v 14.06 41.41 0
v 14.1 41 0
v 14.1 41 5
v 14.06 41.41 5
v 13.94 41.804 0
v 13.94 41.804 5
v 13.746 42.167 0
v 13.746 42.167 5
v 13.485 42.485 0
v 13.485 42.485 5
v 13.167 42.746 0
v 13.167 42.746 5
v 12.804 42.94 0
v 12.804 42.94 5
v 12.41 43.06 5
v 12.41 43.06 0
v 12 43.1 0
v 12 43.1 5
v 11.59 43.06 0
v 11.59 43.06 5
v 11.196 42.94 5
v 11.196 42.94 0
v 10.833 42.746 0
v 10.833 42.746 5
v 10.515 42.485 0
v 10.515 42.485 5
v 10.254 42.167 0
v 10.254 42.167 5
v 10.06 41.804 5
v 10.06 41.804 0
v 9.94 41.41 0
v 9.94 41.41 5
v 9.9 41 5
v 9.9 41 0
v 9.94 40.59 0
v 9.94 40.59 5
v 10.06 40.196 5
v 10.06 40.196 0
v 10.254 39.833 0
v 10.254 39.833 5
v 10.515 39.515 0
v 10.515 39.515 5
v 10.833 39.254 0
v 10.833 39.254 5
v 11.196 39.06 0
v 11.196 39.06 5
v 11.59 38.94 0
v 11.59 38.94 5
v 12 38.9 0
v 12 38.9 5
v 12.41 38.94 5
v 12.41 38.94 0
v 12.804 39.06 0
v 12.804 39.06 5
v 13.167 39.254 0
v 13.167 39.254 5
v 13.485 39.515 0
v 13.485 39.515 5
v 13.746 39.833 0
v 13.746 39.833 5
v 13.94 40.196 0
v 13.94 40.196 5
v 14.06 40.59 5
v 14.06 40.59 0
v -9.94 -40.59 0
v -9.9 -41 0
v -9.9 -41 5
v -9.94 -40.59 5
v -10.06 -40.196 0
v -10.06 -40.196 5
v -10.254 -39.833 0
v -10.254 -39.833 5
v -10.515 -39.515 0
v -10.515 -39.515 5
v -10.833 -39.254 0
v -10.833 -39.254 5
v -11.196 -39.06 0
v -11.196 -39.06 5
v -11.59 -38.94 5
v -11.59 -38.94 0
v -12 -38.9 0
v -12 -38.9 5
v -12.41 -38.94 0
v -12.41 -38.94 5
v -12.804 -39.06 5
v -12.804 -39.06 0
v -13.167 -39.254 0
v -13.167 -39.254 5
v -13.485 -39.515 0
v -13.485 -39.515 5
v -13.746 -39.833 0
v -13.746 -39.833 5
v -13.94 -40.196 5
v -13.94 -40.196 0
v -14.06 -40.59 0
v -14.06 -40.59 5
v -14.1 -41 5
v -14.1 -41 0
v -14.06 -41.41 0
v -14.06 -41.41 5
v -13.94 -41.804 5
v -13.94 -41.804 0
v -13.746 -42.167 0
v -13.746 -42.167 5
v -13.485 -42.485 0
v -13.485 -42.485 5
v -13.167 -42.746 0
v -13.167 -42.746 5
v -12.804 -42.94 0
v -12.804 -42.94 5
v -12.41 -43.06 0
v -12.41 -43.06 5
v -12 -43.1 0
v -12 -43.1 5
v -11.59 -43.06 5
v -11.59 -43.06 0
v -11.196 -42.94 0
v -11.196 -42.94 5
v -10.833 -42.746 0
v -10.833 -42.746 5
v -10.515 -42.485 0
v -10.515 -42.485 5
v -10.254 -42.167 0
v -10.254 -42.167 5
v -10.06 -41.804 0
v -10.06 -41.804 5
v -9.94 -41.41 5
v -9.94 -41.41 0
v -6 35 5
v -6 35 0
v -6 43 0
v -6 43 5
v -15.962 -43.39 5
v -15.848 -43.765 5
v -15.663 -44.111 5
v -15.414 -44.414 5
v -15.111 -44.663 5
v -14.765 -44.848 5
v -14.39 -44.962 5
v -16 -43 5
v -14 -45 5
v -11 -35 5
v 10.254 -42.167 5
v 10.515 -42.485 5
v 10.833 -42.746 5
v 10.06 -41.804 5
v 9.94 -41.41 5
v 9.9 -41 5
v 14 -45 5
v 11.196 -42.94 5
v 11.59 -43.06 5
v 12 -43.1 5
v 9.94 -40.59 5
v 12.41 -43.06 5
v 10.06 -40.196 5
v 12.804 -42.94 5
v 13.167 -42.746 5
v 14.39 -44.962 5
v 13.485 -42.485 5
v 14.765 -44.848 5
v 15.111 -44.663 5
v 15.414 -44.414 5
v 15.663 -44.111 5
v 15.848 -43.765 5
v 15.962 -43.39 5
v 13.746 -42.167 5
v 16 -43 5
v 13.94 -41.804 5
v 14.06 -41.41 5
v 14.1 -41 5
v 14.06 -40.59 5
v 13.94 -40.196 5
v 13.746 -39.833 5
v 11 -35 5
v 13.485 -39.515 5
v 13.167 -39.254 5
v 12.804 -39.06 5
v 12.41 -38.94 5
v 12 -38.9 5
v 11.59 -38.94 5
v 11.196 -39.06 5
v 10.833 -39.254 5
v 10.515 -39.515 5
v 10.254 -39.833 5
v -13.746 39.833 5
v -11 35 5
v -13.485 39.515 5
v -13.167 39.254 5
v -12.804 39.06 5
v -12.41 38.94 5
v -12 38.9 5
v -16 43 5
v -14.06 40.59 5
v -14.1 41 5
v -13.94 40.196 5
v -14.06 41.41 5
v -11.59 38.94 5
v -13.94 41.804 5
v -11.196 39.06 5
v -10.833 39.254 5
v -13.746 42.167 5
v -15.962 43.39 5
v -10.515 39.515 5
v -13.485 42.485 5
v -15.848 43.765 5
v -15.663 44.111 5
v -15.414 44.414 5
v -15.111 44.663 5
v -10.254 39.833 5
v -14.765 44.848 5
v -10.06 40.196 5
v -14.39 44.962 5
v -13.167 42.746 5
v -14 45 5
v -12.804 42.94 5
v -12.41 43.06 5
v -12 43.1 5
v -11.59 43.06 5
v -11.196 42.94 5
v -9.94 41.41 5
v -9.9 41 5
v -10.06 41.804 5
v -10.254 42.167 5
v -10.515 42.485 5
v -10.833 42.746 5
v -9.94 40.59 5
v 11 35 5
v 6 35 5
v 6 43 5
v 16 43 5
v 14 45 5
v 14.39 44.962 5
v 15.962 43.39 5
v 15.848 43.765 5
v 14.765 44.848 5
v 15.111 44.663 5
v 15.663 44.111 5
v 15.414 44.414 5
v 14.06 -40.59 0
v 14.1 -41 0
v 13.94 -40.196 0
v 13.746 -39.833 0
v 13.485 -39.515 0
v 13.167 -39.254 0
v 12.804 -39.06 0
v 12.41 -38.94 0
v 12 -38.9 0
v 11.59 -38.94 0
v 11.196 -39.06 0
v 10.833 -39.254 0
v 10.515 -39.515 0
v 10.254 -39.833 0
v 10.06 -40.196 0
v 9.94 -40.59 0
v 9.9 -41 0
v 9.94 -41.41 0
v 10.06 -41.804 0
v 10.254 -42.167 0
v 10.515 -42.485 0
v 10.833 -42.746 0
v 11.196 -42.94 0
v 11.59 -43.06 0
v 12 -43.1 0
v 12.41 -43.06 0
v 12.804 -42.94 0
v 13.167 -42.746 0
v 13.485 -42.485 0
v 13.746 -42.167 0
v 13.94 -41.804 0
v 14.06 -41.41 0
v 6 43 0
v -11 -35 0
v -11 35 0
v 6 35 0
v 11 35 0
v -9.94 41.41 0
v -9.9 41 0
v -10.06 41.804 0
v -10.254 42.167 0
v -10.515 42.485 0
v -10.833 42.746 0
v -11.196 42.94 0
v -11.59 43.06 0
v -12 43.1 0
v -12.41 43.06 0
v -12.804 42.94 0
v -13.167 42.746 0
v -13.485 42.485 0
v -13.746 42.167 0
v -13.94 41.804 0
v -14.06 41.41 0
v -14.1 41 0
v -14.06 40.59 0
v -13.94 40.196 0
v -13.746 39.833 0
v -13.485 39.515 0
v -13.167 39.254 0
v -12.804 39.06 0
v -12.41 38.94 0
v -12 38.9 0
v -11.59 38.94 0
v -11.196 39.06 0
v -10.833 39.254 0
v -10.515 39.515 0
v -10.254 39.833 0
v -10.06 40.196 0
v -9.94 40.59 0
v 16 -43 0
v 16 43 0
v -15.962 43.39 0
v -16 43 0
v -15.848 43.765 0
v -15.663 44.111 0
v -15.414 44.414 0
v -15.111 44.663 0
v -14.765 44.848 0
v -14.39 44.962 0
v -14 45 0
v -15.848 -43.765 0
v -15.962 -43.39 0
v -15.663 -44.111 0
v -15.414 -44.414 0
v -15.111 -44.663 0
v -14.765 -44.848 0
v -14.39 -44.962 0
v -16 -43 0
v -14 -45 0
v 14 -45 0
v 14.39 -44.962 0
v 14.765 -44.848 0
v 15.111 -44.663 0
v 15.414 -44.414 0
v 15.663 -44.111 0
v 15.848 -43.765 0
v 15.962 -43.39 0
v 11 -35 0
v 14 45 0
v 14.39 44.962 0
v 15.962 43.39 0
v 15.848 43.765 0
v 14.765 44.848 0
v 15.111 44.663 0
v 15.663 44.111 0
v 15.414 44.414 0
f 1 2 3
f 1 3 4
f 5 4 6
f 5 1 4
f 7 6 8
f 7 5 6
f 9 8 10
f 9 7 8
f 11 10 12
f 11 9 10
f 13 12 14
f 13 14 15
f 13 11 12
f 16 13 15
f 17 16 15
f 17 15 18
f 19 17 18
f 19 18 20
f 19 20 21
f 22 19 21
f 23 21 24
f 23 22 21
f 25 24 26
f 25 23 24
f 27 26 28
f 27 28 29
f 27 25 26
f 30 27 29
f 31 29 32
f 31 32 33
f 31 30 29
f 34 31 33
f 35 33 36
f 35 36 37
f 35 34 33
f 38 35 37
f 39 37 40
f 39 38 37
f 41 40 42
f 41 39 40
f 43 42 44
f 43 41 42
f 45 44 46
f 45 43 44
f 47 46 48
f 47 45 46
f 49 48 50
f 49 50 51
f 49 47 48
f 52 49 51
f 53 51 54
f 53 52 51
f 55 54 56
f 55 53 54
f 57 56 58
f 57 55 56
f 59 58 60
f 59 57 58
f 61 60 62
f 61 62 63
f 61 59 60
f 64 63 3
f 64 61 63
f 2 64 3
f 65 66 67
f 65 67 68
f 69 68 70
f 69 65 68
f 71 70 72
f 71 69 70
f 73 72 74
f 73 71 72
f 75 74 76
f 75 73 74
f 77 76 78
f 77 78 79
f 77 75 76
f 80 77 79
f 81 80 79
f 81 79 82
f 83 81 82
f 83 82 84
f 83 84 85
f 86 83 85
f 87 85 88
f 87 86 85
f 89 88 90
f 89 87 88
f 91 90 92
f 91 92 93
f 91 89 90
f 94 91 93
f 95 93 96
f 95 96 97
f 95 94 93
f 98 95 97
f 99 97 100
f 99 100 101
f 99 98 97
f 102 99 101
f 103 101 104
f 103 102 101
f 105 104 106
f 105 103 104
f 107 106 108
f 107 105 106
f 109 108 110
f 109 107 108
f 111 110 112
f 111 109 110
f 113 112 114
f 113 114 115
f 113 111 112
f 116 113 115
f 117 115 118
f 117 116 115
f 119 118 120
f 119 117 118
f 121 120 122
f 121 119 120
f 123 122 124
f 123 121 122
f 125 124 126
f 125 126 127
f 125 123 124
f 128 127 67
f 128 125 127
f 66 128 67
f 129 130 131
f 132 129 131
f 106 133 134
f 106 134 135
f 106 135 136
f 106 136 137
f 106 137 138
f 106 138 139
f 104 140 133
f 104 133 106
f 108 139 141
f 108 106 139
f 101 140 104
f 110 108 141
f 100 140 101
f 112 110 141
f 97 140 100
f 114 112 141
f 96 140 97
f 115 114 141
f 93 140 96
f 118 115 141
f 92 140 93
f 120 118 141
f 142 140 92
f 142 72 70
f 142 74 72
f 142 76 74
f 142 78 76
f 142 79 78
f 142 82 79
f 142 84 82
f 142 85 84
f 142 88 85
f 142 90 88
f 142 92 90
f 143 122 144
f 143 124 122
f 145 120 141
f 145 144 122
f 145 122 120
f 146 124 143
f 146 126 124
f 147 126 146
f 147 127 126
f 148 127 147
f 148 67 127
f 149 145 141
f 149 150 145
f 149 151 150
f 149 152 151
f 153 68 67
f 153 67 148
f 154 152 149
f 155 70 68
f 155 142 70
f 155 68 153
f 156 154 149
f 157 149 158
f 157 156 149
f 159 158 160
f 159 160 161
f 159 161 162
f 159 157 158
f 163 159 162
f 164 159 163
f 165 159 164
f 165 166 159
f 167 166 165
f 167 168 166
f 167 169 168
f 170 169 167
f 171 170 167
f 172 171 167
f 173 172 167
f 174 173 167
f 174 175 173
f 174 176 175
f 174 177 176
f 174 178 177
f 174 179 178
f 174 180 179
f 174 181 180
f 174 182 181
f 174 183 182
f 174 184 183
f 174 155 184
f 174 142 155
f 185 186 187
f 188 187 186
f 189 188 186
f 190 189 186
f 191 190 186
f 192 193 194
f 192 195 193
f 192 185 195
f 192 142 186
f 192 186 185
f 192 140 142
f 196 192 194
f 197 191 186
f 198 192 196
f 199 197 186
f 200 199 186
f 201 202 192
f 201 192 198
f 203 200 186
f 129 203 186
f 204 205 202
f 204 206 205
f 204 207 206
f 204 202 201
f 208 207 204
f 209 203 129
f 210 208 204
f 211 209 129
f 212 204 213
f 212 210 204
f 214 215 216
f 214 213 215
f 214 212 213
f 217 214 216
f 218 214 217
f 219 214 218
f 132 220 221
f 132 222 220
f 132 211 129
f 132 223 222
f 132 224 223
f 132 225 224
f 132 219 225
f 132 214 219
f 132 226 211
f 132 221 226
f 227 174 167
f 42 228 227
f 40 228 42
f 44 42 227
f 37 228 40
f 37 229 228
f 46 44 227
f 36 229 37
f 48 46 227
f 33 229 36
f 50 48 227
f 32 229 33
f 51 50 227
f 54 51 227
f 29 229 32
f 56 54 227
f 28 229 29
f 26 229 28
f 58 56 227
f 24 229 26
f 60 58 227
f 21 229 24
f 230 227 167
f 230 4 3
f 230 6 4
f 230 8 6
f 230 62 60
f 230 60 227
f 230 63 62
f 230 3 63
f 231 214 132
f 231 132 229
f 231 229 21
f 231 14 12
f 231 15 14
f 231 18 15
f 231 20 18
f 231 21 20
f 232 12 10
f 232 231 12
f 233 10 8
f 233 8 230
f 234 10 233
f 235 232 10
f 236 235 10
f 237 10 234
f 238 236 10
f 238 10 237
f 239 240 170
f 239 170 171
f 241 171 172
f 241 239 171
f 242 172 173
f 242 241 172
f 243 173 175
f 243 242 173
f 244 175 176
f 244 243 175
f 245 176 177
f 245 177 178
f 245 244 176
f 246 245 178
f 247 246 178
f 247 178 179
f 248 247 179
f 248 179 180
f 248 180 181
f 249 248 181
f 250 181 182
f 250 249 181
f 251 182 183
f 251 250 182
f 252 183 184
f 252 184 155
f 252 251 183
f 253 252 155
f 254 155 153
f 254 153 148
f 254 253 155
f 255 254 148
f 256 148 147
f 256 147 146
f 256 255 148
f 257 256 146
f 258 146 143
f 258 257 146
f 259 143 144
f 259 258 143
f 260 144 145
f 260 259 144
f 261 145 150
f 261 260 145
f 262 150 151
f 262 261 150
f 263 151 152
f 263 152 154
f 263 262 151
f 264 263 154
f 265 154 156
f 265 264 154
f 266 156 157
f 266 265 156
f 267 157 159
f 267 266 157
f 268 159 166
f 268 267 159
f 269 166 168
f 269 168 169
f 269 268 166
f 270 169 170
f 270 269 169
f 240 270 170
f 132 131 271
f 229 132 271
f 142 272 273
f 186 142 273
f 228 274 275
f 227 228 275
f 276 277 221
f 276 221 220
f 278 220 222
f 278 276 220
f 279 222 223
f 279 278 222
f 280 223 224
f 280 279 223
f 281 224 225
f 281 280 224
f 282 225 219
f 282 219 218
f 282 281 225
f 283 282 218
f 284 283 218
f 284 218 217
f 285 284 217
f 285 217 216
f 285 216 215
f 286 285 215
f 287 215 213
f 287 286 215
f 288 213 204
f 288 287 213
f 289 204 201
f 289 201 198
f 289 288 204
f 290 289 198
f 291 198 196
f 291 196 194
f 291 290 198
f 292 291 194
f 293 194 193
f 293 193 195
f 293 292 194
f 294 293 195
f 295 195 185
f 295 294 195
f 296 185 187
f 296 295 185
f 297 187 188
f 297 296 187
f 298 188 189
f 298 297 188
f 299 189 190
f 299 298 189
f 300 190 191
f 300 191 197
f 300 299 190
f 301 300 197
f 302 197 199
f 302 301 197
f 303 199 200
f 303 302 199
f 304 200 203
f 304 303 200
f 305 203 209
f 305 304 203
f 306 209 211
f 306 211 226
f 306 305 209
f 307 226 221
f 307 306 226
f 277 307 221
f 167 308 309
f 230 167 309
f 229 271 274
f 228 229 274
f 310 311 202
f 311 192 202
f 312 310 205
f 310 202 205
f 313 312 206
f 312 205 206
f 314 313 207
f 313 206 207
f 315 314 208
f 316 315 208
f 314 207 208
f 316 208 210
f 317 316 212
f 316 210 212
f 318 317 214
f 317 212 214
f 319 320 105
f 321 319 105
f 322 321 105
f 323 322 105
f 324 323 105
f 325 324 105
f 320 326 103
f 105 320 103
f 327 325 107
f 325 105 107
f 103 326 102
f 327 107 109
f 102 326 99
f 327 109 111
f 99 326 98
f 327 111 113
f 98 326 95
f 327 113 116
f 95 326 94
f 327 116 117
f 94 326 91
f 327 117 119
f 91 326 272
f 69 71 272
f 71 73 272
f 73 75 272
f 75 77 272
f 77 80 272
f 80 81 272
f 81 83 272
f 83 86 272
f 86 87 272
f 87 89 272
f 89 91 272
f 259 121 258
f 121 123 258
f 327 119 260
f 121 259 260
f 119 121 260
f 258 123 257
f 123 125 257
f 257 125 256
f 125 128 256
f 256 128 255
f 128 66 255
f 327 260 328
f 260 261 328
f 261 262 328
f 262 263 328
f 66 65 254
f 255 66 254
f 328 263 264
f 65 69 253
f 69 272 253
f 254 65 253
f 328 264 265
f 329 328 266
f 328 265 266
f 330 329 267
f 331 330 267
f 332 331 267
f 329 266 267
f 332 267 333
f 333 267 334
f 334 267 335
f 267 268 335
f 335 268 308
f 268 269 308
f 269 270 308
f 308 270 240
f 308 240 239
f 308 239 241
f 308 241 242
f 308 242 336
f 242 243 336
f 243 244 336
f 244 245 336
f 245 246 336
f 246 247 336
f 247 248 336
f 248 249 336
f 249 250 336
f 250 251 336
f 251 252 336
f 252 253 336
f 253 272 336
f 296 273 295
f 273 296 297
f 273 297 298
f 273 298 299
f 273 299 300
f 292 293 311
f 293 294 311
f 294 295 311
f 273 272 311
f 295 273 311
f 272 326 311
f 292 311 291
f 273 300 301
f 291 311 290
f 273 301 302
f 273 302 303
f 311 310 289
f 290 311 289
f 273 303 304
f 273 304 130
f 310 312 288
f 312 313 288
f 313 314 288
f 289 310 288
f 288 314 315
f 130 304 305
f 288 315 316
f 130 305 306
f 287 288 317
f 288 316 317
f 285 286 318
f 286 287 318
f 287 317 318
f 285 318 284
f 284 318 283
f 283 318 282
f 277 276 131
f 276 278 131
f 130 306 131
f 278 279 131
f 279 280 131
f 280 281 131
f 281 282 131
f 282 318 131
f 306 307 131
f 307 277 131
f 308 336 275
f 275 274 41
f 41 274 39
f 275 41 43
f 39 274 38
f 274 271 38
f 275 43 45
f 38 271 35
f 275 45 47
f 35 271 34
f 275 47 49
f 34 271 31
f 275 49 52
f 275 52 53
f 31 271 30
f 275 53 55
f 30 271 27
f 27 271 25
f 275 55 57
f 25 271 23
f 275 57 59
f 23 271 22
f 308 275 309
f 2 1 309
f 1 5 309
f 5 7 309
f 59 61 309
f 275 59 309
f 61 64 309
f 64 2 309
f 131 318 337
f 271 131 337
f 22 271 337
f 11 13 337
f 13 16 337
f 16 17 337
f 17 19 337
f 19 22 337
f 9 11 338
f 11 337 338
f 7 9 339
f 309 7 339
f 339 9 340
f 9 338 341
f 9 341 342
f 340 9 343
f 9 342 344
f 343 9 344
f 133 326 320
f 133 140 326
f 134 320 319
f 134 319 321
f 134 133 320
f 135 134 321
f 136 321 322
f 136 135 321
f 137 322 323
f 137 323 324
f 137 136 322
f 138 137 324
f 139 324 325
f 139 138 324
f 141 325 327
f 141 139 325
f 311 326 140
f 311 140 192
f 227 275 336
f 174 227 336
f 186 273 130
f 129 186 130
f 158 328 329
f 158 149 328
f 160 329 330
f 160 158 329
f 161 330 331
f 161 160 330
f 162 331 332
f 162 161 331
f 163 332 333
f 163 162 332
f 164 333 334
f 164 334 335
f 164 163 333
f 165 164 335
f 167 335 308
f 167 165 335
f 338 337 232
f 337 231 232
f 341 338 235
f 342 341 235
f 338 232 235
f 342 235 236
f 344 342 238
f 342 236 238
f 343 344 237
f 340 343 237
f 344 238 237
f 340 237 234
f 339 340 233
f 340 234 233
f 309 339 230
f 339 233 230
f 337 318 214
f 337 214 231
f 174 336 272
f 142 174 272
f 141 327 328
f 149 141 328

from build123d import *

# Parameters (mm, degrees)
SKETCH_W      = 32
SKETCH_H      = 90
SKETCH_R      = 2.1
EXTRUDE_DEPTH = 5
FILLET_R      = 2


with BuildPart() as part:
    # Sketch → Extrude (new body)
    with BuildSketch(Plane.XY):
        Rectangle(SKETCH_W, SKETCH_H)
        with Locations((-12, 41)):
            Circle(SKETCH_R, mode=Mode.SUBTRACT)
        with Locations((12, 41)):
            Circle(SKETCH_R, mode=Mode.SUBTRACT)
        with Locations((-12, -41)):
            Circle(SKETCH_R, mode=Mode.SUBTRACT)
        with Locations((12, -41)):
            Circle(SKETCH_R, mode=Mode.SUBTRACT)
        Polygon((11, 35), (11, -35), (-11, -35), (-11, 35), (-6, 35), (-6, 43), (6, 43), (6, 35), align=None, mode=Mode.SUBTRACT)
    extrude(amount=EXTRUDE_DEPTH)

    # Fillet
    fillet_edges = [part.edges().sort_by_distance(p)[0] for p in [
        (-16, 45, 2.5),
        (16, 45, 2.5),
        (16, -45, 2.5),
        (-16, -45, 2.5),
    ]]
    fillet(fillet_edges, radius=FILLET_R)


solid = part.part
